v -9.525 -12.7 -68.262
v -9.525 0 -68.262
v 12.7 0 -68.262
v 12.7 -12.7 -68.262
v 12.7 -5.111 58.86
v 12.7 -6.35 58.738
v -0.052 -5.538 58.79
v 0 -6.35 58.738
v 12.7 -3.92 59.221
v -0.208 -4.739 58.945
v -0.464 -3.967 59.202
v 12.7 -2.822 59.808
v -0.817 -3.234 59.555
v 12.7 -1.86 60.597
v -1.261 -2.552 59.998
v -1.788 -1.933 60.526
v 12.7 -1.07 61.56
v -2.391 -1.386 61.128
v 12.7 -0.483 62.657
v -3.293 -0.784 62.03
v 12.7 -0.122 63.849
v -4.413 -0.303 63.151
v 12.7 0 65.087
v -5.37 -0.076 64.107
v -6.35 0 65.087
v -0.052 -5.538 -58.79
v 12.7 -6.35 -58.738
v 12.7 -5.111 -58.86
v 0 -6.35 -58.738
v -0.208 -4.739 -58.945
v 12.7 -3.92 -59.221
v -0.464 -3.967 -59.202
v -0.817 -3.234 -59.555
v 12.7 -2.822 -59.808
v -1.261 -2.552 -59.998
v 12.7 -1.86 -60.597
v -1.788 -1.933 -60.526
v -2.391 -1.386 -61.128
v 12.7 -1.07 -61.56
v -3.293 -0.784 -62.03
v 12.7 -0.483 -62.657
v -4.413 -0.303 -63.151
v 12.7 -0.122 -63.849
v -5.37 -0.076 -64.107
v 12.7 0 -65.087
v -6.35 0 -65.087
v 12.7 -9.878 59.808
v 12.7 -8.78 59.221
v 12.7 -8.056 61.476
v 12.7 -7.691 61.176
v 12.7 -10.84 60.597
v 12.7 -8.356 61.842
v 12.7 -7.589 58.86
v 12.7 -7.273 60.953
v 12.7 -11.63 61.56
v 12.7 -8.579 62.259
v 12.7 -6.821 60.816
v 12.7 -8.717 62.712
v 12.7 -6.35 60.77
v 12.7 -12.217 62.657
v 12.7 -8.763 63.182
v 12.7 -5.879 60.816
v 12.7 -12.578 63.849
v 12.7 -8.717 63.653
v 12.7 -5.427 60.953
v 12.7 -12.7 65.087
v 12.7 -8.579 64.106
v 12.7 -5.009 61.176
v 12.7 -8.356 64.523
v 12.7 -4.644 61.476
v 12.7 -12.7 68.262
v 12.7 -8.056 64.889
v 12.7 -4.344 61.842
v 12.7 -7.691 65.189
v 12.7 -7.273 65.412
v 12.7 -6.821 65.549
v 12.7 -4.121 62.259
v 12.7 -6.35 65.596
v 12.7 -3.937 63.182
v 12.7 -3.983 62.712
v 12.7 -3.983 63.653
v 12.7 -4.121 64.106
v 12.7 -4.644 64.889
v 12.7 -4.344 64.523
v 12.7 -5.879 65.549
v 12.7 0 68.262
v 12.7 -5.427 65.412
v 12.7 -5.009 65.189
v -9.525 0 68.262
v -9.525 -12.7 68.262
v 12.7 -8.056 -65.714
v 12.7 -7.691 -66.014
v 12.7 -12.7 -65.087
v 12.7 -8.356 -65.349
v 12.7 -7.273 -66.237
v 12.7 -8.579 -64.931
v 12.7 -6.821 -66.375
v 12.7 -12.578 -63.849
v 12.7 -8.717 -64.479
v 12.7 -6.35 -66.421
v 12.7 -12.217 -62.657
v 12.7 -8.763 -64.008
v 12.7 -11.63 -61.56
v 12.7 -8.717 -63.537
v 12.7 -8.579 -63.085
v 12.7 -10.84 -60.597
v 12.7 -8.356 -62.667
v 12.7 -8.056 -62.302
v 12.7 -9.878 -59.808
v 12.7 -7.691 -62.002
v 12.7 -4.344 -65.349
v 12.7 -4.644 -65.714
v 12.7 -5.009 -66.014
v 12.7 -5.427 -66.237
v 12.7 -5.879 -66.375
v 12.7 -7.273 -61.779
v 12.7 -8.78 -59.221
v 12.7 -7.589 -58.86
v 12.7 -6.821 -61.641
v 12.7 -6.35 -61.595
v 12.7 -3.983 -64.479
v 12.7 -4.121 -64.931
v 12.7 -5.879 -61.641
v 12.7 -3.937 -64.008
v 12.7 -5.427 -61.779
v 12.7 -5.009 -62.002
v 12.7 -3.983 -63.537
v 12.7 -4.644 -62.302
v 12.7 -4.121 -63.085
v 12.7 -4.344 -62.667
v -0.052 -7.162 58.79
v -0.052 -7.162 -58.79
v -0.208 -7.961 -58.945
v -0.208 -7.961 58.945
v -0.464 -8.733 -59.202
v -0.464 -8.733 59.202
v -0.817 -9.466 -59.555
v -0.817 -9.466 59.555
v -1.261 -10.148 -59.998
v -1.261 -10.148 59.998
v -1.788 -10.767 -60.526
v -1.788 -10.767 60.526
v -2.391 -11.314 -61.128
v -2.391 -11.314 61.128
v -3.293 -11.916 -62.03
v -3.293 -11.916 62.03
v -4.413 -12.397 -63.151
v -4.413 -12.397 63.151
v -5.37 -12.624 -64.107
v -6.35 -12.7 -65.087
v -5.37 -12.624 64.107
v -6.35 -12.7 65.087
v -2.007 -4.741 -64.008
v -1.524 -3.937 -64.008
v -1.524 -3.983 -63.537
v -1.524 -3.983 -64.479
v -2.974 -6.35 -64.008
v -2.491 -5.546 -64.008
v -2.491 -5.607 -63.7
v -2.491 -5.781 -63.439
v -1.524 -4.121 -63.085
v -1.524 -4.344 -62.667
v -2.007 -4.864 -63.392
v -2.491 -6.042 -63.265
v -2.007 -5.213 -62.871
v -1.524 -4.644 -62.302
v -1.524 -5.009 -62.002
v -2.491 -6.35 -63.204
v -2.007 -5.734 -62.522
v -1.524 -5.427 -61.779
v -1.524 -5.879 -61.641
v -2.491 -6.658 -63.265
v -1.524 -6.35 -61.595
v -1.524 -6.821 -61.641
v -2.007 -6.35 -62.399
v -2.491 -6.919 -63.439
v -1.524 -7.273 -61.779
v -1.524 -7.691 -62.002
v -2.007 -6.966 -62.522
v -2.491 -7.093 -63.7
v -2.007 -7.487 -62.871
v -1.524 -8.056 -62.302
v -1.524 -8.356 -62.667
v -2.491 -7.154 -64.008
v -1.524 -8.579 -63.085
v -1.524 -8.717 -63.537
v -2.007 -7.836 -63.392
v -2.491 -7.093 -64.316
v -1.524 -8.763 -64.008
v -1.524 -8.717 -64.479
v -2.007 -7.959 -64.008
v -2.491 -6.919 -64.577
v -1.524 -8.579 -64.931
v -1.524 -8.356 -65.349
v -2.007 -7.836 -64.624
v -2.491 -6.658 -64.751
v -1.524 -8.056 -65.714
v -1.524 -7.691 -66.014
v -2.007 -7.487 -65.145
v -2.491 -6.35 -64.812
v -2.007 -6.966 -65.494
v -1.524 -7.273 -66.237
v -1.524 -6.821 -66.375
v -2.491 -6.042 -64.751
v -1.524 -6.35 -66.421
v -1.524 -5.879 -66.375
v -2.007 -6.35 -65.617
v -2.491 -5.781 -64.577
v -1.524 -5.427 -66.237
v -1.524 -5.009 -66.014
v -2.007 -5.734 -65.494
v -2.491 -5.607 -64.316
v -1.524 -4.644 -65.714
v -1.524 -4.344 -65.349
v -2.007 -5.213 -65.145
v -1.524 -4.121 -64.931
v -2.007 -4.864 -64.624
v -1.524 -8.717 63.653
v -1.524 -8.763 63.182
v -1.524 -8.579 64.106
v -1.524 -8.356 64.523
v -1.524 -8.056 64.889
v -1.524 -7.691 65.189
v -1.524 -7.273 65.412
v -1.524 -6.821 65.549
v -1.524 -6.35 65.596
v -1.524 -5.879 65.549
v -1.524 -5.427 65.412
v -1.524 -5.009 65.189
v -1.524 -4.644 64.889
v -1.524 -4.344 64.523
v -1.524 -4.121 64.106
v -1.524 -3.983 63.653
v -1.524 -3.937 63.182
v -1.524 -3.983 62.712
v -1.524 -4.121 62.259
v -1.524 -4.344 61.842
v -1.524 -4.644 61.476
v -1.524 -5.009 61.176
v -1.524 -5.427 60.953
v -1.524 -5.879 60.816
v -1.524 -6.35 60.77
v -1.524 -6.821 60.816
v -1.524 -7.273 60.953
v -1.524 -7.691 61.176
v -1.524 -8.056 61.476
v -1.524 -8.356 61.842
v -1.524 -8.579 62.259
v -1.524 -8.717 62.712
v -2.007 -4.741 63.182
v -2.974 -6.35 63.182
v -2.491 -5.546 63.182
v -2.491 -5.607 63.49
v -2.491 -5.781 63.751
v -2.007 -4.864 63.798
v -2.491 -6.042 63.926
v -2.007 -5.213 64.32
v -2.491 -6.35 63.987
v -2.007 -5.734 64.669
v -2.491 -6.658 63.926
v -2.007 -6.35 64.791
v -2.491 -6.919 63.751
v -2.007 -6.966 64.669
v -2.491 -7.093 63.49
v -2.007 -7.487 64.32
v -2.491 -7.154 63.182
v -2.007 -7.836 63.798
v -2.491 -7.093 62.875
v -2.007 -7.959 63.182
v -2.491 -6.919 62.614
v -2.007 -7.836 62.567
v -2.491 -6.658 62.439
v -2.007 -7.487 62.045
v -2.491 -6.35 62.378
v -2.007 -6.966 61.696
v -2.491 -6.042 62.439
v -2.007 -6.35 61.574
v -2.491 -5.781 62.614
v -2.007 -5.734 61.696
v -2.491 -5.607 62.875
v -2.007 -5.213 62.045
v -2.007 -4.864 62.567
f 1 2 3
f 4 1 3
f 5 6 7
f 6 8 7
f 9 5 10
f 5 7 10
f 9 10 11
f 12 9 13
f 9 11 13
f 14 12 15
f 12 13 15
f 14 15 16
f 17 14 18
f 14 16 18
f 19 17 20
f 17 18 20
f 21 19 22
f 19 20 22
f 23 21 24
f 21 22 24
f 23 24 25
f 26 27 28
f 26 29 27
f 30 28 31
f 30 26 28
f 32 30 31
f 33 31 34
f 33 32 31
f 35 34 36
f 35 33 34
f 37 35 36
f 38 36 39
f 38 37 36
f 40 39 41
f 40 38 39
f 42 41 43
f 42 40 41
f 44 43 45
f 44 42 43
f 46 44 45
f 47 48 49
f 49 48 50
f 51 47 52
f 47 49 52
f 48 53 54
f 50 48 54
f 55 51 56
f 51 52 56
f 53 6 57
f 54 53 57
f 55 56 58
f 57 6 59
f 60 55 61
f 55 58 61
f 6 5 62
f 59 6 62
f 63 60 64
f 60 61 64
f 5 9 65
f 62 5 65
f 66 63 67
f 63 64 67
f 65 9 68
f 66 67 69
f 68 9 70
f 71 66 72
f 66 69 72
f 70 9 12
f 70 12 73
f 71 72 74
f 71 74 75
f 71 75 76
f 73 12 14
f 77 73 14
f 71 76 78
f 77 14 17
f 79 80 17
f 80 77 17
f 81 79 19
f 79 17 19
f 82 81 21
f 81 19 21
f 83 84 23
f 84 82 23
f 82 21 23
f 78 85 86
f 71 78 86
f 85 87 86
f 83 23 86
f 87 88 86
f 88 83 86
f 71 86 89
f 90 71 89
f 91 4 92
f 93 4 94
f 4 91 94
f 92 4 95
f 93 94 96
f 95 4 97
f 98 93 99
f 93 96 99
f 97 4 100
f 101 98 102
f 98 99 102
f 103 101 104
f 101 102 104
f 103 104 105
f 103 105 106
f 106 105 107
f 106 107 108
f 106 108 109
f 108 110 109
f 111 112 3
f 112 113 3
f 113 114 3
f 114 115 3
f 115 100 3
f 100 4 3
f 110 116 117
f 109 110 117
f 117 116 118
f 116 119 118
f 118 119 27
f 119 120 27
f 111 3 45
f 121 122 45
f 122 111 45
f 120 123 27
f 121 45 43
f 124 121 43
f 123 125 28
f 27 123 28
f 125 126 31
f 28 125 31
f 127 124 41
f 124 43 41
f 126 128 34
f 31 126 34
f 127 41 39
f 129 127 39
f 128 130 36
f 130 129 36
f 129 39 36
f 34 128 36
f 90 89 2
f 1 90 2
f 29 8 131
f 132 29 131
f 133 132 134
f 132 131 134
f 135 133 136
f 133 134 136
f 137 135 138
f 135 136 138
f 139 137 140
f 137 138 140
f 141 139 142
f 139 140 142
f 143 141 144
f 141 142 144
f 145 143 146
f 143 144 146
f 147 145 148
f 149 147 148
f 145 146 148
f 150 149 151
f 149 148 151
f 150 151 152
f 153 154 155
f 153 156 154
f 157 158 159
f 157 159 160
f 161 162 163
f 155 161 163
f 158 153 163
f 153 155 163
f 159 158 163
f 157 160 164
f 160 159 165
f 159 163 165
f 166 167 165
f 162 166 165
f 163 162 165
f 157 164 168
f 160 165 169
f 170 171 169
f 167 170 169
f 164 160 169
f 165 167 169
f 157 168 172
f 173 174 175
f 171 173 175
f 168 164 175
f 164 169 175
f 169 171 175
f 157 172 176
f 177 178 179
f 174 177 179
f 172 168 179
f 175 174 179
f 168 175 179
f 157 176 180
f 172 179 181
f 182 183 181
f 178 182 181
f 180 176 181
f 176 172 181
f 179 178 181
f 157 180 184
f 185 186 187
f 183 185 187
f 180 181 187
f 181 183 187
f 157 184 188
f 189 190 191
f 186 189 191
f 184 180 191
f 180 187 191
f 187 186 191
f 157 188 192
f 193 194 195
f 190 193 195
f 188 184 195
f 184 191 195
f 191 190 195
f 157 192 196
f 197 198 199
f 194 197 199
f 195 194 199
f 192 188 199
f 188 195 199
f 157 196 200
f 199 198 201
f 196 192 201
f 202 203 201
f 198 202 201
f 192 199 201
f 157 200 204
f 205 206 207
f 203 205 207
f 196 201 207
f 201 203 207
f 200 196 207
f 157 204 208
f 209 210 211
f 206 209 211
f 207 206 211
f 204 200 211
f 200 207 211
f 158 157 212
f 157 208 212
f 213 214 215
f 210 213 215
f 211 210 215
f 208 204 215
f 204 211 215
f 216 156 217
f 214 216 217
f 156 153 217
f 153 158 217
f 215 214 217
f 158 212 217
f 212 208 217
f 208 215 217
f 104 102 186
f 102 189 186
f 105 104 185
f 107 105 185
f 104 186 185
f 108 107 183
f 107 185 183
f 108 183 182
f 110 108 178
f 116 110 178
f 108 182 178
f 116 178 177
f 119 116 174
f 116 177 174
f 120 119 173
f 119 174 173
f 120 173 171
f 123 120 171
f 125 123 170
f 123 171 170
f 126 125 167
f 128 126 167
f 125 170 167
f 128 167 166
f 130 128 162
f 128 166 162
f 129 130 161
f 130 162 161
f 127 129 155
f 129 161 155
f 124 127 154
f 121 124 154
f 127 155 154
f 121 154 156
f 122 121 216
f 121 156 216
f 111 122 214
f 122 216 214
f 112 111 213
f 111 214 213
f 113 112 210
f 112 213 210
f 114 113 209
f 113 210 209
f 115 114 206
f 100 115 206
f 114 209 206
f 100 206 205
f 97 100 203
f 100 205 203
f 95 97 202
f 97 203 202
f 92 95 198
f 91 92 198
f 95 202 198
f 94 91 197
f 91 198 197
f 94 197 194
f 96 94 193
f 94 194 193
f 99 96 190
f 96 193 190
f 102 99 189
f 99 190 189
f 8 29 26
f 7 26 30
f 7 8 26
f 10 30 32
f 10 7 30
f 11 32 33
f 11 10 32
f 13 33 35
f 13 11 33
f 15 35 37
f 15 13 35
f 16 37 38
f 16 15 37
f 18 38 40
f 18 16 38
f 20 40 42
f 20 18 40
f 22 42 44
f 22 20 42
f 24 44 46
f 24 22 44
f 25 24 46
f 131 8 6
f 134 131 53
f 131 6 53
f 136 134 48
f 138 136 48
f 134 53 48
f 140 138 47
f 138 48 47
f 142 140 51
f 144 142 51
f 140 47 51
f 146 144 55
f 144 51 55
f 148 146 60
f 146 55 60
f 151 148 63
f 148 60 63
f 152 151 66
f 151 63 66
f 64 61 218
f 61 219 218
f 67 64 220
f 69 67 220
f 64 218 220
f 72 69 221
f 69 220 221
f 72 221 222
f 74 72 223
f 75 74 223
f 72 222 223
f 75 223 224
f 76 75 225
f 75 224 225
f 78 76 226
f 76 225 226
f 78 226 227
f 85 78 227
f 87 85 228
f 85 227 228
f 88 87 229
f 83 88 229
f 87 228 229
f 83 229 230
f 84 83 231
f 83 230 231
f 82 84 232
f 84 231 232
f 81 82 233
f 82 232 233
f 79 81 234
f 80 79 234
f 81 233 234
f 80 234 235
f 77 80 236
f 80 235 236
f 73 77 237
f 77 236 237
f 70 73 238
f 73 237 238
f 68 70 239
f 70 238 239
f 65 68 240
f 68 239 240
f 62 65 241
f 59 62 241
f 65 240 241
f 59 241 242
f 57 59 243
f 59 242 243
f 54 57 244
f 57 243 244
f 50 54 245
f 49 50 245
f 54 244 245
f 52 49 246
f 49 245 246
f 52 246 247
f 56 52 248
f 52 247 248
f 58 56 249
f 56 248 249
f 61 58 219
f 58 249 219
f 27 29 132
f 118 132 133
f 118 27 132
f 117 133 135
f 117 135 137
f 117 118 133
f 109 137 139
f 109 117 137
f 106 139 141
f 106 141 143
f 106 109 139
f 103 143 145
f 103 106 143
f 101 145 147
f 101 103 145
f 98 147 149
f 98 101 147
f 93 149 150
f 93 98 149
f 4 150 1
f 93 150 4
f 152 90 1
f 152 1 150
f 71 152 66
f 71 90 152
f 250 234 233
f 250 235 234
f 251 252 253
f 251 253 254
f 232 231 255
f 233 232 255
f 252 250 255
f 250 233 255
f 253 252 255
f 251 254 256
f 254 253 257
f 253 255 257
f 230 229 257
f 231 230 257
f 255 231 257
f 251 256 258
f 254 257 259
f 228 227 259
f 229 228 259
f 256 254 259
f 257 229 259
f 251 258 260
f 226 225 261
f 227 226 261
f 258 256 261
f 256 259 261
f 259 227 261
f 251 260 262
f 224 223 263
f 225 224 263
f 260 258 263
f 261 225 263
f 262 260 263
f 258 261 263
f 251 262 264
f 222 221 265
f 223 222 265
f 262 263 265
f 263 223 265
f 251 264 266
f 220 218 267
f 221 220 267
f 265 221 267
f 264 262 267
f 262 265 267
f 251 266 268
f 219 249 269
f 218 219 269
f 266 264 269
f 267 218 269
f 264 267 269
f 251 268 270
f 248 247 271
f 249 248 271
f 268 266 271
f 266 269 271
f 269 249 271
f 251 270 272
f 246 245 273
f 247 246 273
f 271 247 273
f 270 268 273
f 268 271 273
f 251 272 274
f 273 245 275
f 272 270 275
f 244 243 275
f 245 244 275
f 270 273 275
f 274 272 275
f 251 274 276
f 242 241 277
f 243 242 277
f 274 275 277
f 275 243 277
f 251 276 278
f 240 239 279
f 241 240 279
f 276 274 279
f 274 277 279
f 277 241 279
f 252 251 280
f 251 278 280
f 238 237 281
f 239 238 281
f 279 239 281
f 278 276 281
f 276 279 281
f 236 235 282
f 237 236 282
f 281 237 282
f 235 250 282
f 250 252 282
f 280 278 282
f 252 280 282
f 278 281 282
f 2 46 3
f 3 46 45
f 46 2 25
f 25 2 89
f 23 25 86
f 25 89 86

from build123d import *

# Parameters (mm, degrees)
F1_DEPTH = 12.7
F2_R     = 6.34999
F3_R     = 6.34999
F4_DEPTH = 3.175
F6_D     = 4.826
F6_DEPTH = 14.224
F6_TIP   = 1.4498766737
F8_D     = 4.826
F8_DEPTH = 14.224
F8_TIP   = 1.4498766737


# Not quite as in the source:
# - a fillet or chamfer is up to 0.001 mm smaller than in the source, because OpenCascade refuses the exact size


with BuildPart() as f1:
    # F0 (on Front) → F1 (new body)
    with BuildSketch(Plane.XZ):
        Polygon((12.7, 64.008), (12.7, 68.2625), (-12.7, 68.2625), (-12.7, -68.2625), (12.7, -68.2625), (12.7, -64.008), (12.7, -58.7375), (0, -58.7375), (0, 58.7375), (12.7, 58.7375), align=None)
    extrude(amount=F1_DEPTH)

    # F2 (radius 6.35 in the source; OpenCascade refuses exactly that, so slightly less here)
    f2_edges = [f1.edges().sort_by_distance(p)[0] for p in [
        (0, -12.7, 0),
        (0, 0, 0),
    ]]
    fillet(f2_edges, radius=F2_R)

    # F3 (radius 6.35 in the source; OpenCascade refuses exactly that, so slightly less here)
    f3_edges = [f1.edges().sort_by_distance(p)[0] for p in [
        (6.35, -12.7, 58.7375),
        (6.35, 0, 58.7375),
        (6.35, -12.7, -58.7375),
        (6.35, 0, -58.7375),
    ]]
    fillet(f3_edges, radius=F3_R)

    # F4 (cut): a face of the model
    f4_faces = [f1.faces().sort_by_distance(p)[0] for p in [
        (-12.7, -6.35, 0),
    ]]
    extrude(f4_faces, amount=-F4_DEPTH, mode=Mode.SUBTRACT)

    # F6
    with Locations(Plane.YZ.offset(12.7)):
        with Locations((-6.35, 63.1825)):
            Hole(F6_D / 2, depth=F6_DEPTH)
            with Locations((0, 0, -(F6_DEPTH + F6_TIP / 2))):  # 118° drill point
                Cone(0, F6_D / 2, F6_TIP, mode=Mode.SUBTRACT)

    # F8
    with Locations(Plane.YZ.offset(12.7)):
        with Locations((-6.35, -64.008)):
            Hole(F8_D / 2, depth=F8_DEPTH)
            with Locations((0, 0, -(F8_DEPTH + F8_TIP / 2))):  # 118° drill point
                Cone(0, F8_D / 2, F8_TIP, mode=Mode.SUBTRACT)


solid = f1.part
